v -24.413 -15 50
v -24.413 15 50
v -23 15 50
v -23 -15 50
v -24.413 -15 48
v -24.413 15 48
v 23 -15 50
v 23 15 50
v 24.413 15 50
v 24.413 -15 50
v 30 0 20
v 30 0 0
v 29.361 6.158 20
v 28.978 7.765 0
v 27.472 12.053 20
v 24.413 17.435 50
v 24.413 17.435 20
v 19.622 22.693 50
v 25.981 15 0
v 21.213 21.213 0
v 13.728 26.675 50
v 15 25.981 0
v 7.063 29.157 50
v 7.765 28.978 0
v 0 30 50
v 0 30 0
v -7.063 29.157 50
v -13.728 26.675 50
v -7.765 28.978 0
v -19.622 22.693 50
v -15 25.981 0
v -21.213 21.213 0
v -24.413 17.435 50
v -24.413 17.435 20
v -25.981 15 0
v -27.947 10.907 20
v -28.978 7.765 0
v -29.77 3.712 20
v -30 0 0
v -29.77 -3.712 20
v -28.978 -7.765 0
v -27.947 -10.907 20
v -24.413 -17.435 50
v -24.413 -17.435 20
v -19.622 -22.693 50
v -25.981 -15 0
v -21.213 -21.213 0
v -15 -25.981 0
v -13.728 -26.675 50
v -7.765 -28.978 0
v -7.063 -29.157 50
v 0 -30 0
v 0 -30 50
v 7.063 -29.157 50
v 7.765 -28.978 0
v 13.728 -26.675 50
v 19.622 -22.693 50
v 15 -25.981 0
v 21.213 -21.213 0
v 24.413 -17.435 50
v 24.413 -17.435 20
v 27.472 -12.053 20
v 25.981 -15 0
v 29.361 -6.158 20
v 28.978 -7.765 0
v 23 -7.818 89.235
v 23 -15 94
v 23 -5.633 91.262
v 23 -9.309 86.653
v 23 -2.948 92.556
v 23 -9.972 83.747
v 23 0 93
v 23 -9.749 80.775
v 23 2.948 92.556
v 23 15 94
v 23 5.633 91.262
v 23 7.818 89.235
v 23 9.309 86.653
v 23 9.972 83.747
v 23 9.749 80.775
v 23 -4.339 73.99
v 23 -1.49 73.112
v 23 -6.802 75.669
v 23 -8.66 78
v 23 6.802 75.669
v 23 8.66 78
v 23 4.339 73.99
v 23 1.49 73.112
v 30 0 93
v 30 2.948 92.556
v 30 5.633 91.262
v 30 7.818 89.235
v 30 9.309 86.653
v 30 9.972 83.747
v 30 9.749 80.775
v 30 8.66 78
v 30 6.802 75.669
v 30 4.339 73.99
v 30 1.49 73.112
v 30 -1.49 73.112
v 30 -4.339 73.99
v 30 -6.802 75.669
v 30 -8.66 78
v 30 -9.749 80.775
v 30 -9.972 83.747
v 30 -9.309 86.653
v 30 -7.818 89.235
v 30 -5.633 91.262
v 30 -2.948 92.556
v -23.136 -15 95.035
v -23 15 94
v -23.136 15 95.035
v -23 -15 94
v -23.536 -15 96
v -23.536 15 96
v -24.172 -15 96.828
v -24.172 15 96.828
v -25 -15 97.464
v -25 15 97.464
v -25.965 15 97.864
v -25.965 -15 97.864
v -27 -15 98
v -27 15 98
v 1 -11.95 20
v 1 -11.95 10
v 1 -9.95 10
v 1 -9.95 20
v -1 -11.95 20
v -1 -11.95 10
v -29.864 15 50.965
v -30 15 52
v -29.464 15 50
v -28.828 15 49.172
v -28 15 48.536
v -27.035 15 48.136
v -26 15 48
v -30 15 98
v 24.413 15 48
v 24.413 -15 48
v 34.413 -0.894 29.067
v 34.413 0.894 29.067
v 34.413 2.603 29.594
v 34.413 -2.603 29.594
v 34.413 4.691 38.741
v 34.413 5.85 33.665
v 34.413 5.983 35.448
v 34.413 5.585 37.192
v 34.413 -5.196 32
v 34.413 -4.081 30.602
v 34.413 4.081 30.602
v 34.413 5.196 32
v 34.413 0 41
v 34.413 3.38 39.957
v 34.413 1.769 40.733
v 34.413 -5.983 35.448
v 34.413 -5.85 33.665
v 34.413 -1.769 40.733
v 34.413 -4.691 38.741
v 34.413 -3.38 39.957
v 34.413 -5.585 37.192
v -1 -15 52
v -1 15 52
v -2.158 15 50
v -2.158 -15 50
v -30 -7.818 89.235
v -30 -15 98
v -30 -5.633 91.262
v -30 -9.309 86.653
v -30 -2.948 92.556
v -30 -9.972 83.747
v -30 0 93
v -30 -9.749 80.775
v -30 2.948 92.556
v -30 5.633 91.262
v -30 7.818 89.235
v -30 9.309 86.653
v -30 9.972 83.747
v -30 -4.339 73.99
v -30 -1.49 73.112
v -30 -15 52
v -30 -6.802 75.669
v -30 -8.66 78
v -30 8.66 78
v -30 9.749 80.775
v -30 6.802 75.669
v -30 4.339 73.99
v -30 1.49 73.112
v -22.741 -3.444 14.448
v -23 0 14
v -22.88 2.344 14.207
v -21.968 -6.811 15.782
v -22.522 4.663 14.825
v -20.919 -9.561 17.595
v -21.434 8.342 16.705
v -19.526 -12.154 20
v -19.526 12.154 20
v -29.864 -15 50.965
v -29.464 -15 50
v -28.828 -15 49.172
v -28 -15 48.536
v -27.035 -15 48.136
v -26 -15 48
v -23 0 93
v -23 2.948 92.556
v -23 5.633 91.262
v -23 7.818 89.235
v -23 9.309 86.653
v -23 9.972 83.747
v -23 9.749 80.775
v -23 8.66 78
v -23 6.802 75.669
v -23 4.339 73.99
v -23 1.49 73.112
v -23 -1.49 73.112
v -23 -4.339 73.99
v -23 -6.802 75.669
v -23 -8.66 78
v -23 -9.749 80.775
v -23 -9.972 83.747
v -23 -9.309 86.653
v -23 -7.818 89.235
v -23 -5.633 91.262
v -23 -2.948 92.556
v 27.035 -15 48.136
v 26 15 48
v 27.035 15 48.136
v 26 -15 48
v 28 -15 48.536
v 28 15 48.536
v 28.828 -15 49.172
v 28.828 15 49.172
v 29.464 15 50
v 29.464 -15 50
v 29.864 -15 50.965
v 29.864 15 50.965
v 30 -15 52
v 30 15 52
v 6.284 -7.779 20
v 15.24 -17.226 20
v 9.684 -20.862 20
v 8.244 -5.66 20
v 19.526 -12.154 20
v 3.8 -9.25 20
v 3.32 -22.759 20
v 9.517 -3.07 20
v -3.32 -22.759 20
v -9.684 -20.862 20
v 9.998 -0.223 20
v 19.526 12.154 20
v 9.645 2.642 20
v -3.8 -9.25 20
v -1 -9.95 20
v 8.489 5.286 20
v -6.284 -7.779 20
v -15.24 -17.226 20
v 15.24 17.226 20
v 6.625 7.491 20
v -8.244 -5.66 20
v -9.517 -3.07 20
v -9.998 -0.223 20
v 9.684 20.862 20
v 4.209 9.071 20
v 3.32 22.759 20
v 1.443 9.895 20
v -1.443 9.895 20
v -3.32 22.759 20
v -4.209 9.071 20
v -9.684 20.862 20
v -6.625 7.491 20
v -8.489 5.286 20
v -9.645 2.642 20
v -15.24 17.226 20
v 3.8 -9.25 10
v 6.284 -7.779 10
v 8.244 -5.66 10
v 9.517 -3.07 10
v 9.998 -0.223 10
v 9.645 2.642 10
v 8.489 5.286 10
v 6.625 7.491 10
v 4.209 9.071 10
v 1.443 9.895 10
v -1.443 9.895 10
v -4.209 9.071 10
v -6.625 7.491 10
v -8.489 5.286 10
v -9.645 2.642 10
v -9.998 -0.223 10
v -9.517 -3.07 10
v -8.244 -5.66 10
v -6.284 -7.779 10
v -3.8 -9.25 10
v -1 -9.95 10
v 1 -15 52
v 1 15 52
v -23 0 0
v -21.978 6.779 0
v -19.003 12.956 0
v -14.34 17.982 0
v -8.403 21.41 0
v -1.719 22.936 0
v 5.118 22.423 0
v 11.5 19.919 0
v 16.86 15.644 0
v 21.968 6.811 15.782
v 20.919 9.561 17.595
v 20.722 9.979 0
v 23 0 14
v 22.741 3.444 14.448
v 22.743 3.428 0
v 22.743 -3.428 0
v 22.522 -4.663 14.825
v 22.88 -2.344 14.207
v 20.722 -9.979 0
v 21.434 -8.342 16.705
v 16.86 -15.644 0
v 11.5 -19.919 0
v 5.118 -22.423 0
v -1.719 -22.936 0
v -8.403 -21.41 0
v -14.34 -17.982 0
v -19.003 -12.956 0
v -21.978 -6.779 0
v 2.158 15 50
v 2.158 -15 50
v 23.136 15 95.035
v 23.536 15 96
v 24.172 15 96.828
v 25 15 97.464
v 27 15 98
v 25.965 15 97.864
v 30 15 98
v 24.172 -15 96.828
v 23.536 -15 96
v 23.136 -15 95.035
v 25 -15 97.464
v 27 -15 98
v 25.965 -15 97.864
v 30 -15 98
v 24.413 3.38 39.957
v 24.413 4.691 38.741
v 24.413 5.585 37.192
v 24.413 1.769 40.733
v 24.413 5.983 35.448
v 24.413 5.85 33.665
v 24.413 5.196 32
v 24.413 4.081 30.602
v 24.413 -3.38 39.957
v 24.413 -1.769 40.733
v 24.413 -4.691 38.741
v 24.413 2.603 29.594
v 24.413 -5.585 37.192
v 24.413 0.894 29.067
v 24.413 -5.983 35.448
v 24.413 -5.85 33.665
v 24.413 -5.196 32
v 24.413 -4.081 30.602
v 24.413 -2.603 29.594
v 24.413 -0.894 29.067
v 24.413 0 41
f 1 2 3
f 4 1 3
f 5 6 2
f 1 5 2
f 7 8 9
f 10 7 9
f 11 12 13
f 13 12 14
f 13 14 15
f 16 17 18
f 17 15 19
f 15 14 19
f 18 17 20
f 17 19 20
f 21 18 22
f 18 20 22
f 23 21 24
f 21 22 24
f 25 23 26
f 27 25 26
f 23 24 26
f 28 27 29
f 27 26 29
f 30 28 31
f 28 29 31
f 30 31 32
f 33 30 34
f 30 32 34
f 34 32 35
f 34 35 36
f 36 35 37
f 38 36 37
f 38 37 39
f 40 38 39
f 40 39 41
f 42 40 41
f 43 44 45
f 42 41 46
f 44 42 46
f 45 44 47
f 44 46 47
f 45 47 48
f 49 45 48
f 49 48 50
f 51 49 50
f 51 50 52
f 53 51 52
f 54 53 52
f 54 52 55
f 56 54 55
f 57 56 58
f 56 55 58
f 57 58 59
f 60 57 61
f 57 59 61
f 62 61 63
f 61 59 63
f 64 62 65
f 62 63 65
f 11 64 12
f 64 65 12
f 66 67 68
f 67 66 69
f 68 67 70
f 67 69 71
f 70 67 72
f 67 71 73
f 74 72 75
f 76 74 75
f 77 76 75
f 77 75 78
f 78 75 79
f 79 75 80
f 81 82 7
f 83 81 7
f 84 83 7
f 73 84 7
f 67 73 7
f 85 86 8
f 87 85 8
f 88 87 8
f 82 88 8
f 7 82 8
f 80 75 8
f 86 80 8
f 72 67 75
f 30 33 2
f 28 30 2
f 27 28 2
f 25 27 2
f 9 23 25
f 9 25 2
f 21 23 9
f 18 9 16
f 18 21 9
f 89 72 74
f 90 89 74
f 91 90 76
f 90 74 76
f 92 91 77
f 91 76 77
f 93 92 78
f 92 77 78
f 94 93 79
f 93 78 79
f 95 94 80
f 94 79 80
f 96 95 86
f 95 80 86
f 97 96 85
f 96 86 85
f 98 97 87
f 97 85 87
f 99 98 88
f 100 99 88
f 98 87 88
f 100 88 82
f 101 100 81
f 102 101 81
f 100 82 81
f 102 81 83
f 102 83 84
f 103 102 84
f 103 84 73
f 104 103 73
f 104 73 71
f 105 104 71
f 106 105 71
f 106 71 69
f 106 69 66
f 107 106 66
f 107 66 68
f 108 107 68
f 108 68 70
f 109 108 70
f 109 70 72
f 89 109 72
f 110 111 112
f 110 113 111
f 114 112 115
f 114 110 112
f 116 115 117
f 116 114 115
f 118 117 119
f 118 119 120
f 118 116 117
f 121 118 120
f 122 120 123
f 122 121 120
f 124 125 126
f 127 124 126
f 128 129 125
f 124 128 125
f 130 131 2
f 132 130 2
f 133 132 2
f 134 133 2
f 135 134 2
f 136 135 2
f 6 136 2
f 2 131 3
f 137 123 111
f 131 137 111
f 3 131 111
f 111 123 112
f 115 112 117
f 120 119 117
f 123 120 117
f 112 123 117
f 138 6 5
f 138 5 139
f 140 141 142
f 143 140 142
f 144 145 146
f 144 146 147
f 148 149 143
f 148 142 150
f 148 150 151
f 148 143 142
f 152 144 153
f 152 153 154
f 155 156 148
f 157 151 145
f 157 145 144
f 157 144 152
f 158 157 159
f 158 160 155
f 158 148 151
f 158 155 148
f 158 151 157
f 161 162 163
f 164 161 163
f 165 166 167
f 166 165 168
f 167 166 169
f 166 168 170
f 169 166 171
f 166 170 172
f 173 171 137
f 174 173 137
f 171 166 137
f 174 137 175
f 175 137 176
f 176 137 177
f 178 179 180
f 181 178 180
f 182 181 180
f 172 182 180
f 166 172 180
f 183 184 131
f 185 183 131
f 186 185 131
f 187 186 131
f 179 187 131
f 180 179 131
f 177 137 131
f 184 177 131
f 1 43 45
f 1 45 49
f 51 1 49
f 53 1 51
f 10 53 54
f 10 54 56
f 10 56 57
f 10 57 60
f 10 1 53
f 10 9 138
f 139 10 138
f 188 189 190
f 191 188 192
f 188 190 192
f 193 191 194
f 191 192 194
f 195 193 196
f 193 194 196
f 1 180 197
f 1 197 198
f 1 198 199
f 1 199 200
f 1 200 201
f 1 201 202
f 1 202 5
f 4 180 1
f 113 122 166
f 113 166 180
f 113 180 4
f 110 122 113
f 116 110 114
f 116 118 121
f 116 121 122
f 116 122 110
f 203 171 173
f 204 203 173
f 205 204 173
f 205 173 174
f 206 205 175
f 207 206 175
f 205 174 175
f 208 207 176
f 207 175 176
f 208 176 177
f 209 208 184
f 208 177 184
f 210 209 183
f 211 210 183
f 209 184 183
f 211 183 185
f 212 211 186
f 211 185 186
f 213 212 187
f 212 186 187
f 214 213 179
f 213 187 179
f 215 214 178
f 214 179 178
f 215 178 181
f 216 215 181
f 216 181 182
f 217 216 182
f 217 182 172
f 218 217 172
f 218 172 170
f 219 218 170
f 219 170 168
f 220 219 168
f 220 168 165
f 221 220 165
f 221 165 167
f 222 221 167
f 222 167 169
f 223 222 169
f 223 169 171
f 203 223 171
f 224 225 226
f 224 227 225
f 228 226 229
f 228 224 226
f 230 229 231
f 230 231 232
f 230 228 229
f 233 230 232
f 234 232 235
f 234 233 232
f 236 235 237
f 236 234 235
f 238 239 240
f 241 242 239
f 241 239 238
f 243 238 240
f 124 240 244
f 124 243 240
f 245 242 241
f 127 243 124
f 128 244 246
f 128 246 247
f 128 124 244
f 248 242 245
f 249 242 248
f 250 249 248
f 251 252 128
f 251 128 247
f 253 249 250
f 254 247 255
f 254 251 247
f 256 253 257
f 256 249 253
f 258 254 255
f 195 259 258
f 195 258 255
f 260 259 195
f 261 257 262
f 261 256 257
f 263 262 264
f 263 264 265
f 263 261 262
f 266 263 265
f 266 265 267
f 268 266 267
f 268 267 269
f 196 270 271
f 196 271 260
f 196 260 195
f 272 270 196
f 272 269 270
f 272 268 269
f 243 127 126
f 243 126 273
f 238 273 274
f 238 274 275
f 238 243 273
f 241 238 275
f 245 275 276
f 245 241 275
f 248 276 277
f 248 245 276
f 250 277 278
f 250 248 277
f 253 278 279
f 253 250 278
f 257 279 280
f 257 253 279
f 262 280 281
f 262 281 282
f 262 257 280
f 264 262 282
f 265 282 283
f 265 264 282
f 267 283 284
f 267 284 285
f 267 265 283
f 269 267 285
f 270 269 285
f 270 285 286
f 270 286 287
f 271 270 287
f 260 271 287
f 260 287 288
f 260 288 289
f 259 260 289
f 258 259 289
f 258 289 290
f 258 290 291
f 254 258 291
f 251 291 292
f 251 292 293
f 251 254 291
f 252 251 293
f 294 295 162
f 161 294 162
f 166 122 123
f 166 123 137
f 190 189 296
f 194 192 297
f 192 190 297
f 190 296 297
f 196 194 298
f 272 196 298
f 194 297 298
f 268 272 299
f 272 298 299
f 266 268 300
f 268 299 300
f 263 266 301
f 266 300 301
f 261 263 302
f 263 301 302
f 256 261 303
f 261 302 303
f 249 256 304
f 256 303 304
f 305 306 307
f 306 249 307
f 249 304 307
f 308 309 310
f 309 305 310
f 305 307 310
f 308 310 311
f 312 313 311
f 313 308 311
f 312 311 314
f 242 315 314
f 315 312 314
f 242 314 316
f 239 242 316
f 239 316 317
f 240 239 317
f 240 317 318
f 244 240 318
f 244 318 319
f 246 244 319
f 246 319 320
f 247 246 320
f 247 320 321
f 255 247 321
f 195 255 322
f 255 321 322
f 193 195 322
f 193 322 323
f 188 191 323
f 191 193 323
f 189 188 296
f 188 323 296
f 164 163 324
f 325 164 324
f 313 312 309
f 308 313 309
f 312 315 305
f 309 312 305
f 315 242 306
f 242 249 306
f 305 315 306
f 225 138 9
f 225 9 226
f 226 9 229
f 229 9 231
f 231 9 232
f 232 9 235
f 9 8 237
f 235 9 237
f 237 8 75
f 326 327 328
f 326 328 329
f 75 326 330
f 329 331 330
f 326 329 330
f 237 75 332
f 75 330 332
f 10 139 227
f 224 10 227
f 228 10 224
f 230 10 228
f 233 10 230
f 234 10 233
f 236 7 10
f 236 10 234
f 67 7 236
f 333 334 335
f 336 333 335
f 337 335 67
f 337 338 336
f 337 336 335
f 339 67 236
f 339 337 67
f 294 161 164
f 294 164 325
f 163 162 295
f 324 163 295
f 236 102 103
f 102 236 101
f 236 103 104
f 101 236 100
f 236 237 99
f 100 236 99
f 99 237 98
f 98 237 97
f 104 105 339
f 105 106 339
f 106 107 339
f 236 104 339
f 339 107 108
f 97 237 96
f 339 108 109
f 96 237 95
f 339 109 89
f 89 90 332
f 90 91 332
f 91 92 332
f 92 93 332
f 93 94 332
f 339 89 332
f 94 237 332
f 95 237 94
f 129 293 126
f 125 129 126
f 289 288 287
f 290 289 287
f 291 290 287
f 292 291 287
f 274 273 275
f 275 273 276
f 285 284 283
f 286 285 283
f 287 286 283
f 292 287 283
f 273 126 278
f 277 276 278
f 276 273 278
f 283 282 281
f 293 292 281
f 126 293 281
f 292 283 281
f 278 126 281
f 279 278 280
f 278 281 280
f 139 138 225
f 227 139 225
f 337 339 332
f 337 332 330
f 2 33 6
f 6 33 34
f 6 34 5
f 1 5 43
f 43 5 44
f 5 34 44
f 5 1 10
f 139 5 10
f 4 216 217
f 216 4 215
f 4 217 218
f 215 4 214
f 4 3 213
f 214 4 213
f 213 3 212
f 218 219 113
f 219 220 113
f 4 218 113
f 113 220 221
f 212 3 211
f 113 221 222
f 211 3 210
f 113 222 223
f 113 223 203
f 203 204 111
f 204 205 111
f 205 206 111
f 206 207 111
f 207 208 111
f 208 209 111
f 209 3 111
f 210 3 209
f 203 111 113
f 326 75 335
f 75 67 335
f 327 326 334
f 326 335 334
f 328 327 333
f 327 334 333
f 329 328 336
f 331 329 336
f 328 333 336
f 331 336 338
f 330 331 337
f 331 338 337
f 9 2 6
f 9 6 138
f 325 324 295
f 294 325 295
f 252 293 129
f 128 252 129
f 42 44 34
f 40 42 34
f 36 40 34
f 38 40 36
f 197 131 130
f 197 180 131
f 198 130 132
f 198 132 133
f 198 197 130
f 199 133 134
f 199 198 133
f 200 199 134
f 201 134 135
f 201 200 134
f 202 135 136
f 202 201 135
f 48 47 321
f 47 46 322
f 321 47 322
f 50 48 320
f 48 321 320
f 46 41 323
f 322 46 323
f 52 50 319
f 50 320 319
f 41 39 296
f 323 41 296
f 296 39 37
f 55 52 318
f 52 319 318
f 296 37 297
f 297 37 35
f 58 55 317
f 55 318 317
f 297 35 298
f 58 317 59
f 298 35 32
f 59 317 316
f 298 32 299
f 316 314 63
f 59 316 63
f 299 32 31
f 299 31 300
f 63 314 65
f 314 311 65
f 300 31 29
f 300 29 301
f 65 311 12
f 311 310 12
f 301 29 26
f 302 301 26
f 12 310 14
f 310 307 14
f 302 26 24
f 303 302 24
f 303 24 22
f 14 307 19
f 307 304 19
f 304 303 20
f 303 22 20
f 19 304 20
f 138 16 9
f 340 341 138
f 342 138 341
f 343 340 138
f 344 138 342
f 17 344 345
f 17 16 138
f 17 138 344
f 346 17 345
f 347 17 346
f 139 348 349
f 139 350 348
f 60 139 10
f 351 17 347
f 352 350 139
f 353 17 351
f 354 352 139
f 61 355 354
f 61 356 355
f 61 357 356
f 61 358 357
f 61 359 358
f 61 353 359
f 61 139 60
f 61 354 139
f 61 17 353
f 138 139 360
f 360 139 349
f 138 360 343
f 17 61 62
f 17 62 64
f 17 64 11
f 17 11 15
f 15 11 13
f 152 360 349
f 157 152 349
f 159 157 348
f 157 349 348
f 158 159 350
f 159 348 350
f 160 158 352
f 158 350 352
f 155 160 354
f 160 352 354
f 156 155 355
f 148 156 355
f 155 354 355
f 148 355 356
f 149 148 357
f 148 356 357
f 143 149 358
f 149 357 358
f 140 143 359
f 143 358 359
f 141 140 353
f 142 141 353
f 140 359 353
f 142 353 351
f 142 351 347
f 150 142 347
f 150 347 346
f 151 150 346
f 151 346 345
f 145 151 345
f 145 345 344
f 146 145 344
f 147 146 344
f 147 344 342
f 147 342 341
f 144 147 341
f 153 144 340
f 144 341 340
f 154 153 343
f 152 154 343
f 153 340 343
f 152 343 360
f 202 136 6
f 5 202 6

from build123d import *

# Parameters (mm, degrees)
SKETCH1_R           = 30
BOSS_EXTRUDE1_DEPTH = 50
SKETCH2_R           = 23
CUT_EXTRUDE1_DEPTH  = 20
CUT_EXTRUDE2_START  = -30
CUT_EXTRUDE2_DEPTH  = 30
SKETCH5_R           = 6
BOSS_EXTRUDE3_DEPTH = 10
SKETCH6_W           = 48.826406872
SKETCH6_H           = 30
CUT_EXTRUDE3_DEPTH  = 2
BOSS_EXTRUDE4_DEPTH = 30
SKETCH8_R           = 10
CUT_EXTRUDE4_DEPTH  = 122.049827661
FILLET1_R           = 4
FILLET2_R           = 4
BOSS_EXTRUDE5_DEPTH = 10


with BuildPart() as part:
    # Sketch1 → Boss-Extrude1 (new body)
    with BuildSketch(Plane.XY):
        Circle(SKETCH1_R)
    extrude(amount=BOSS_EXTRUDE1_DEPTH)

    # Sketch2 → Cut-Extrude1 (cut)
    with BuildSketch(Plane(origin=(0, 0, 0), x_dir=(-1, 0, 0), z_dir=(0, 0, -1))):
        Circle(SKETCH2_R)
    extrude(amount=-CUT_EXTRUDE1_DEPTH, mode=Mode.SUBTRACT)

    # Sketch3 → Cut-Extrude2 (cut)
    with BuildSketch(Plane.XY.offset(50).offset(CUT_EXTRUDE2_START)):
        with BuildLine():
            Line((-24.413203436, 17.43546667), (-24.413203436, -17.43546667))
            ThreePointArc((-24.413203436, -17.43546667), (-30, 0), (-24.413203436, 17.43546667))
        make_face()
        with BuildLine():
            Line((24.413203436, 17.43546667), (24.413203436, -17.43546667))
            ThreePointArc((24.413203436, -17.43546667), (30, 0), (24.413203436, 17.43546667))
        make_face()
    extrude(amount=CUT_EXTRUDE2_DEPTH, mode=Mode.SUBTRACT)

    # Sketch5 → Boss-Extrude3 (add)
    with BuildSketch(Plane(origin=(24.413203436, 0, 0), x_dir=(0, 0, -1), z_dir=(1, 0, 0))):
        with Locations(Location((-35, 0, 0), (0, 0, 180))):
            Circle(SKETCH5_R)
    extrude(amount=BOSS_EXTRUDE3_DEPTH)

    # Sketch6 → Cut-Extrude3 (cut)
    with BuildSketch(Plane.XY.offset(50)):
        Rectangle(SKETCH6_W, SKETCH6_H)
    extrude(amount=-CUT_EXTRUDE3_DEPTH, mode=Mode.SUBTRACT)

    # Sketch7 → Boss-Extrude4 (add)
    with BuildSketch(Plane.XZ.offset(-15)):
        Polygon((-23, 50), (-23, 98), (-30, 98), (-30, 48), (-24.413203436, 48), (-24.413203436, 50), align=None)
        Polygon((-3.315789474, 48), (-23, 48), (-23, 14), align=None)
        Polygon((-1, 52), (-2.157894737, 50), (2.157894737, 50), (1, 52), align=None)
        Polygon((23, 48), (3.315789474, 48), (23, 14), align=None)
        Polygon((23, 98), (23, 50), (24.413203436, 50), (24.413203436, 48), (30, 48), (30, 98), align=None)
    extrude(amount=BOSS_EXTRUDE4_DEPTH)


with BuildPart() as boss_extrude4_piece_1:
    # of the separate pieces the step leaves, piece 1, a body of its own (boss_extrude4_pieces)
    add(part.part.solids().sort_by_distance((30, 0, 0))[0])

    # Sketch9 → Boss-Extrude5 (add)
    with BuildSketch(Plane(origin=(0, 0, 20), x_dir=(-1, 0, 0), z_dir=(0, 0, -1))):
        with BuildLine():
            Line((0, -11.949874371), (-1, -11.949874371))
            Line((-1, -11.949874371), (-1, -9.949874371))
            ThreePointArc((-1, -9.949874371), (0, 10), (1, -9.949874371))
            Line((1, -9.949874371), (1, -11.949874371))
            Line((1, -11.949874371), (0, -11.949874371))
        make_face()
    extrude(amount=BOSS_EXTRUDE5_DEPTH)


with BuildPart() as boss_extrude4_piece_2:
    # of the separate pieces the step leaves, piece 2, a body of its own (boss_extrude4_pieces)
    add(part.part.solids().sort_by_distance((-23, -15, 98))[0])


with BuildPart() as boss_extrude4_piece_3:
    # of the separate pieces the step leaves, piece 3, a body of its own (boss_extrude4_pieces)
    add(part.part.solids().sort_by_distance((23, -15, 98))[0])


with BuildPart() as boss_extrude4_piece_4:
    # of the separate pieces the step leaves, piece 4, a body of its own (boss_extrude4_pieces)
    add(part.part.solids().sort_by_distance((1, 15, 52))[0])


with BuildPart() as cut_extrude4_tool:
    # Sketch8 → Cut-Extrude4 (new, through all)
    with BuildSketch(Plane.ZY.offset(30)):
        with Locations((83, 0)):
            Circle(SKETCH8_R)
    extrude(amount=-CUT_EXTRUDE4_DEPTH)


with BuildPart() as boss_extrude4_piece_2_1:
    add(boss_extrude4_piece_2.part)

    # Cut-Extrude4: cut by cut_extrude4_tool
    add(cut_extrude4_tool.part, mode=Mode.SUBTRACT)

    # Fillet2
    fillet2_edges = [boss_extrude4_piece_2_1.edges().sort_by_distance(p)[0] for p in [
        (-23, 0, 98),
        (-30, 0, 48),
    ]]
    fillet(fillet2_edges, radius=FILLET2_R)


with BuildPart() as boss_extrude4_piece_3_1:
    add(boss_extrude4_piece_3.part)

    # Cut-Extrude4: cut by cut_extrude4_tool
    add(cut_extrude4_tool.part, mode=Mode.SUBTRACT)

    # Fillet1
    fillet1_edges = [boss_extrude4_piece_3_1.edges().sort_by_distance(p)[0] for p in [
        (30, 0, 48),
        (23, 0, 98),
    ]]
    fillet(fillet1_edges, radius=FILLET1_R)


solid = Compound([boss_extrude4_piece_1.part, boss_extrude4_piece_4.part, boss_extrude4_piece_2_1.part, boss_extrude4_piece_3_1.part])
